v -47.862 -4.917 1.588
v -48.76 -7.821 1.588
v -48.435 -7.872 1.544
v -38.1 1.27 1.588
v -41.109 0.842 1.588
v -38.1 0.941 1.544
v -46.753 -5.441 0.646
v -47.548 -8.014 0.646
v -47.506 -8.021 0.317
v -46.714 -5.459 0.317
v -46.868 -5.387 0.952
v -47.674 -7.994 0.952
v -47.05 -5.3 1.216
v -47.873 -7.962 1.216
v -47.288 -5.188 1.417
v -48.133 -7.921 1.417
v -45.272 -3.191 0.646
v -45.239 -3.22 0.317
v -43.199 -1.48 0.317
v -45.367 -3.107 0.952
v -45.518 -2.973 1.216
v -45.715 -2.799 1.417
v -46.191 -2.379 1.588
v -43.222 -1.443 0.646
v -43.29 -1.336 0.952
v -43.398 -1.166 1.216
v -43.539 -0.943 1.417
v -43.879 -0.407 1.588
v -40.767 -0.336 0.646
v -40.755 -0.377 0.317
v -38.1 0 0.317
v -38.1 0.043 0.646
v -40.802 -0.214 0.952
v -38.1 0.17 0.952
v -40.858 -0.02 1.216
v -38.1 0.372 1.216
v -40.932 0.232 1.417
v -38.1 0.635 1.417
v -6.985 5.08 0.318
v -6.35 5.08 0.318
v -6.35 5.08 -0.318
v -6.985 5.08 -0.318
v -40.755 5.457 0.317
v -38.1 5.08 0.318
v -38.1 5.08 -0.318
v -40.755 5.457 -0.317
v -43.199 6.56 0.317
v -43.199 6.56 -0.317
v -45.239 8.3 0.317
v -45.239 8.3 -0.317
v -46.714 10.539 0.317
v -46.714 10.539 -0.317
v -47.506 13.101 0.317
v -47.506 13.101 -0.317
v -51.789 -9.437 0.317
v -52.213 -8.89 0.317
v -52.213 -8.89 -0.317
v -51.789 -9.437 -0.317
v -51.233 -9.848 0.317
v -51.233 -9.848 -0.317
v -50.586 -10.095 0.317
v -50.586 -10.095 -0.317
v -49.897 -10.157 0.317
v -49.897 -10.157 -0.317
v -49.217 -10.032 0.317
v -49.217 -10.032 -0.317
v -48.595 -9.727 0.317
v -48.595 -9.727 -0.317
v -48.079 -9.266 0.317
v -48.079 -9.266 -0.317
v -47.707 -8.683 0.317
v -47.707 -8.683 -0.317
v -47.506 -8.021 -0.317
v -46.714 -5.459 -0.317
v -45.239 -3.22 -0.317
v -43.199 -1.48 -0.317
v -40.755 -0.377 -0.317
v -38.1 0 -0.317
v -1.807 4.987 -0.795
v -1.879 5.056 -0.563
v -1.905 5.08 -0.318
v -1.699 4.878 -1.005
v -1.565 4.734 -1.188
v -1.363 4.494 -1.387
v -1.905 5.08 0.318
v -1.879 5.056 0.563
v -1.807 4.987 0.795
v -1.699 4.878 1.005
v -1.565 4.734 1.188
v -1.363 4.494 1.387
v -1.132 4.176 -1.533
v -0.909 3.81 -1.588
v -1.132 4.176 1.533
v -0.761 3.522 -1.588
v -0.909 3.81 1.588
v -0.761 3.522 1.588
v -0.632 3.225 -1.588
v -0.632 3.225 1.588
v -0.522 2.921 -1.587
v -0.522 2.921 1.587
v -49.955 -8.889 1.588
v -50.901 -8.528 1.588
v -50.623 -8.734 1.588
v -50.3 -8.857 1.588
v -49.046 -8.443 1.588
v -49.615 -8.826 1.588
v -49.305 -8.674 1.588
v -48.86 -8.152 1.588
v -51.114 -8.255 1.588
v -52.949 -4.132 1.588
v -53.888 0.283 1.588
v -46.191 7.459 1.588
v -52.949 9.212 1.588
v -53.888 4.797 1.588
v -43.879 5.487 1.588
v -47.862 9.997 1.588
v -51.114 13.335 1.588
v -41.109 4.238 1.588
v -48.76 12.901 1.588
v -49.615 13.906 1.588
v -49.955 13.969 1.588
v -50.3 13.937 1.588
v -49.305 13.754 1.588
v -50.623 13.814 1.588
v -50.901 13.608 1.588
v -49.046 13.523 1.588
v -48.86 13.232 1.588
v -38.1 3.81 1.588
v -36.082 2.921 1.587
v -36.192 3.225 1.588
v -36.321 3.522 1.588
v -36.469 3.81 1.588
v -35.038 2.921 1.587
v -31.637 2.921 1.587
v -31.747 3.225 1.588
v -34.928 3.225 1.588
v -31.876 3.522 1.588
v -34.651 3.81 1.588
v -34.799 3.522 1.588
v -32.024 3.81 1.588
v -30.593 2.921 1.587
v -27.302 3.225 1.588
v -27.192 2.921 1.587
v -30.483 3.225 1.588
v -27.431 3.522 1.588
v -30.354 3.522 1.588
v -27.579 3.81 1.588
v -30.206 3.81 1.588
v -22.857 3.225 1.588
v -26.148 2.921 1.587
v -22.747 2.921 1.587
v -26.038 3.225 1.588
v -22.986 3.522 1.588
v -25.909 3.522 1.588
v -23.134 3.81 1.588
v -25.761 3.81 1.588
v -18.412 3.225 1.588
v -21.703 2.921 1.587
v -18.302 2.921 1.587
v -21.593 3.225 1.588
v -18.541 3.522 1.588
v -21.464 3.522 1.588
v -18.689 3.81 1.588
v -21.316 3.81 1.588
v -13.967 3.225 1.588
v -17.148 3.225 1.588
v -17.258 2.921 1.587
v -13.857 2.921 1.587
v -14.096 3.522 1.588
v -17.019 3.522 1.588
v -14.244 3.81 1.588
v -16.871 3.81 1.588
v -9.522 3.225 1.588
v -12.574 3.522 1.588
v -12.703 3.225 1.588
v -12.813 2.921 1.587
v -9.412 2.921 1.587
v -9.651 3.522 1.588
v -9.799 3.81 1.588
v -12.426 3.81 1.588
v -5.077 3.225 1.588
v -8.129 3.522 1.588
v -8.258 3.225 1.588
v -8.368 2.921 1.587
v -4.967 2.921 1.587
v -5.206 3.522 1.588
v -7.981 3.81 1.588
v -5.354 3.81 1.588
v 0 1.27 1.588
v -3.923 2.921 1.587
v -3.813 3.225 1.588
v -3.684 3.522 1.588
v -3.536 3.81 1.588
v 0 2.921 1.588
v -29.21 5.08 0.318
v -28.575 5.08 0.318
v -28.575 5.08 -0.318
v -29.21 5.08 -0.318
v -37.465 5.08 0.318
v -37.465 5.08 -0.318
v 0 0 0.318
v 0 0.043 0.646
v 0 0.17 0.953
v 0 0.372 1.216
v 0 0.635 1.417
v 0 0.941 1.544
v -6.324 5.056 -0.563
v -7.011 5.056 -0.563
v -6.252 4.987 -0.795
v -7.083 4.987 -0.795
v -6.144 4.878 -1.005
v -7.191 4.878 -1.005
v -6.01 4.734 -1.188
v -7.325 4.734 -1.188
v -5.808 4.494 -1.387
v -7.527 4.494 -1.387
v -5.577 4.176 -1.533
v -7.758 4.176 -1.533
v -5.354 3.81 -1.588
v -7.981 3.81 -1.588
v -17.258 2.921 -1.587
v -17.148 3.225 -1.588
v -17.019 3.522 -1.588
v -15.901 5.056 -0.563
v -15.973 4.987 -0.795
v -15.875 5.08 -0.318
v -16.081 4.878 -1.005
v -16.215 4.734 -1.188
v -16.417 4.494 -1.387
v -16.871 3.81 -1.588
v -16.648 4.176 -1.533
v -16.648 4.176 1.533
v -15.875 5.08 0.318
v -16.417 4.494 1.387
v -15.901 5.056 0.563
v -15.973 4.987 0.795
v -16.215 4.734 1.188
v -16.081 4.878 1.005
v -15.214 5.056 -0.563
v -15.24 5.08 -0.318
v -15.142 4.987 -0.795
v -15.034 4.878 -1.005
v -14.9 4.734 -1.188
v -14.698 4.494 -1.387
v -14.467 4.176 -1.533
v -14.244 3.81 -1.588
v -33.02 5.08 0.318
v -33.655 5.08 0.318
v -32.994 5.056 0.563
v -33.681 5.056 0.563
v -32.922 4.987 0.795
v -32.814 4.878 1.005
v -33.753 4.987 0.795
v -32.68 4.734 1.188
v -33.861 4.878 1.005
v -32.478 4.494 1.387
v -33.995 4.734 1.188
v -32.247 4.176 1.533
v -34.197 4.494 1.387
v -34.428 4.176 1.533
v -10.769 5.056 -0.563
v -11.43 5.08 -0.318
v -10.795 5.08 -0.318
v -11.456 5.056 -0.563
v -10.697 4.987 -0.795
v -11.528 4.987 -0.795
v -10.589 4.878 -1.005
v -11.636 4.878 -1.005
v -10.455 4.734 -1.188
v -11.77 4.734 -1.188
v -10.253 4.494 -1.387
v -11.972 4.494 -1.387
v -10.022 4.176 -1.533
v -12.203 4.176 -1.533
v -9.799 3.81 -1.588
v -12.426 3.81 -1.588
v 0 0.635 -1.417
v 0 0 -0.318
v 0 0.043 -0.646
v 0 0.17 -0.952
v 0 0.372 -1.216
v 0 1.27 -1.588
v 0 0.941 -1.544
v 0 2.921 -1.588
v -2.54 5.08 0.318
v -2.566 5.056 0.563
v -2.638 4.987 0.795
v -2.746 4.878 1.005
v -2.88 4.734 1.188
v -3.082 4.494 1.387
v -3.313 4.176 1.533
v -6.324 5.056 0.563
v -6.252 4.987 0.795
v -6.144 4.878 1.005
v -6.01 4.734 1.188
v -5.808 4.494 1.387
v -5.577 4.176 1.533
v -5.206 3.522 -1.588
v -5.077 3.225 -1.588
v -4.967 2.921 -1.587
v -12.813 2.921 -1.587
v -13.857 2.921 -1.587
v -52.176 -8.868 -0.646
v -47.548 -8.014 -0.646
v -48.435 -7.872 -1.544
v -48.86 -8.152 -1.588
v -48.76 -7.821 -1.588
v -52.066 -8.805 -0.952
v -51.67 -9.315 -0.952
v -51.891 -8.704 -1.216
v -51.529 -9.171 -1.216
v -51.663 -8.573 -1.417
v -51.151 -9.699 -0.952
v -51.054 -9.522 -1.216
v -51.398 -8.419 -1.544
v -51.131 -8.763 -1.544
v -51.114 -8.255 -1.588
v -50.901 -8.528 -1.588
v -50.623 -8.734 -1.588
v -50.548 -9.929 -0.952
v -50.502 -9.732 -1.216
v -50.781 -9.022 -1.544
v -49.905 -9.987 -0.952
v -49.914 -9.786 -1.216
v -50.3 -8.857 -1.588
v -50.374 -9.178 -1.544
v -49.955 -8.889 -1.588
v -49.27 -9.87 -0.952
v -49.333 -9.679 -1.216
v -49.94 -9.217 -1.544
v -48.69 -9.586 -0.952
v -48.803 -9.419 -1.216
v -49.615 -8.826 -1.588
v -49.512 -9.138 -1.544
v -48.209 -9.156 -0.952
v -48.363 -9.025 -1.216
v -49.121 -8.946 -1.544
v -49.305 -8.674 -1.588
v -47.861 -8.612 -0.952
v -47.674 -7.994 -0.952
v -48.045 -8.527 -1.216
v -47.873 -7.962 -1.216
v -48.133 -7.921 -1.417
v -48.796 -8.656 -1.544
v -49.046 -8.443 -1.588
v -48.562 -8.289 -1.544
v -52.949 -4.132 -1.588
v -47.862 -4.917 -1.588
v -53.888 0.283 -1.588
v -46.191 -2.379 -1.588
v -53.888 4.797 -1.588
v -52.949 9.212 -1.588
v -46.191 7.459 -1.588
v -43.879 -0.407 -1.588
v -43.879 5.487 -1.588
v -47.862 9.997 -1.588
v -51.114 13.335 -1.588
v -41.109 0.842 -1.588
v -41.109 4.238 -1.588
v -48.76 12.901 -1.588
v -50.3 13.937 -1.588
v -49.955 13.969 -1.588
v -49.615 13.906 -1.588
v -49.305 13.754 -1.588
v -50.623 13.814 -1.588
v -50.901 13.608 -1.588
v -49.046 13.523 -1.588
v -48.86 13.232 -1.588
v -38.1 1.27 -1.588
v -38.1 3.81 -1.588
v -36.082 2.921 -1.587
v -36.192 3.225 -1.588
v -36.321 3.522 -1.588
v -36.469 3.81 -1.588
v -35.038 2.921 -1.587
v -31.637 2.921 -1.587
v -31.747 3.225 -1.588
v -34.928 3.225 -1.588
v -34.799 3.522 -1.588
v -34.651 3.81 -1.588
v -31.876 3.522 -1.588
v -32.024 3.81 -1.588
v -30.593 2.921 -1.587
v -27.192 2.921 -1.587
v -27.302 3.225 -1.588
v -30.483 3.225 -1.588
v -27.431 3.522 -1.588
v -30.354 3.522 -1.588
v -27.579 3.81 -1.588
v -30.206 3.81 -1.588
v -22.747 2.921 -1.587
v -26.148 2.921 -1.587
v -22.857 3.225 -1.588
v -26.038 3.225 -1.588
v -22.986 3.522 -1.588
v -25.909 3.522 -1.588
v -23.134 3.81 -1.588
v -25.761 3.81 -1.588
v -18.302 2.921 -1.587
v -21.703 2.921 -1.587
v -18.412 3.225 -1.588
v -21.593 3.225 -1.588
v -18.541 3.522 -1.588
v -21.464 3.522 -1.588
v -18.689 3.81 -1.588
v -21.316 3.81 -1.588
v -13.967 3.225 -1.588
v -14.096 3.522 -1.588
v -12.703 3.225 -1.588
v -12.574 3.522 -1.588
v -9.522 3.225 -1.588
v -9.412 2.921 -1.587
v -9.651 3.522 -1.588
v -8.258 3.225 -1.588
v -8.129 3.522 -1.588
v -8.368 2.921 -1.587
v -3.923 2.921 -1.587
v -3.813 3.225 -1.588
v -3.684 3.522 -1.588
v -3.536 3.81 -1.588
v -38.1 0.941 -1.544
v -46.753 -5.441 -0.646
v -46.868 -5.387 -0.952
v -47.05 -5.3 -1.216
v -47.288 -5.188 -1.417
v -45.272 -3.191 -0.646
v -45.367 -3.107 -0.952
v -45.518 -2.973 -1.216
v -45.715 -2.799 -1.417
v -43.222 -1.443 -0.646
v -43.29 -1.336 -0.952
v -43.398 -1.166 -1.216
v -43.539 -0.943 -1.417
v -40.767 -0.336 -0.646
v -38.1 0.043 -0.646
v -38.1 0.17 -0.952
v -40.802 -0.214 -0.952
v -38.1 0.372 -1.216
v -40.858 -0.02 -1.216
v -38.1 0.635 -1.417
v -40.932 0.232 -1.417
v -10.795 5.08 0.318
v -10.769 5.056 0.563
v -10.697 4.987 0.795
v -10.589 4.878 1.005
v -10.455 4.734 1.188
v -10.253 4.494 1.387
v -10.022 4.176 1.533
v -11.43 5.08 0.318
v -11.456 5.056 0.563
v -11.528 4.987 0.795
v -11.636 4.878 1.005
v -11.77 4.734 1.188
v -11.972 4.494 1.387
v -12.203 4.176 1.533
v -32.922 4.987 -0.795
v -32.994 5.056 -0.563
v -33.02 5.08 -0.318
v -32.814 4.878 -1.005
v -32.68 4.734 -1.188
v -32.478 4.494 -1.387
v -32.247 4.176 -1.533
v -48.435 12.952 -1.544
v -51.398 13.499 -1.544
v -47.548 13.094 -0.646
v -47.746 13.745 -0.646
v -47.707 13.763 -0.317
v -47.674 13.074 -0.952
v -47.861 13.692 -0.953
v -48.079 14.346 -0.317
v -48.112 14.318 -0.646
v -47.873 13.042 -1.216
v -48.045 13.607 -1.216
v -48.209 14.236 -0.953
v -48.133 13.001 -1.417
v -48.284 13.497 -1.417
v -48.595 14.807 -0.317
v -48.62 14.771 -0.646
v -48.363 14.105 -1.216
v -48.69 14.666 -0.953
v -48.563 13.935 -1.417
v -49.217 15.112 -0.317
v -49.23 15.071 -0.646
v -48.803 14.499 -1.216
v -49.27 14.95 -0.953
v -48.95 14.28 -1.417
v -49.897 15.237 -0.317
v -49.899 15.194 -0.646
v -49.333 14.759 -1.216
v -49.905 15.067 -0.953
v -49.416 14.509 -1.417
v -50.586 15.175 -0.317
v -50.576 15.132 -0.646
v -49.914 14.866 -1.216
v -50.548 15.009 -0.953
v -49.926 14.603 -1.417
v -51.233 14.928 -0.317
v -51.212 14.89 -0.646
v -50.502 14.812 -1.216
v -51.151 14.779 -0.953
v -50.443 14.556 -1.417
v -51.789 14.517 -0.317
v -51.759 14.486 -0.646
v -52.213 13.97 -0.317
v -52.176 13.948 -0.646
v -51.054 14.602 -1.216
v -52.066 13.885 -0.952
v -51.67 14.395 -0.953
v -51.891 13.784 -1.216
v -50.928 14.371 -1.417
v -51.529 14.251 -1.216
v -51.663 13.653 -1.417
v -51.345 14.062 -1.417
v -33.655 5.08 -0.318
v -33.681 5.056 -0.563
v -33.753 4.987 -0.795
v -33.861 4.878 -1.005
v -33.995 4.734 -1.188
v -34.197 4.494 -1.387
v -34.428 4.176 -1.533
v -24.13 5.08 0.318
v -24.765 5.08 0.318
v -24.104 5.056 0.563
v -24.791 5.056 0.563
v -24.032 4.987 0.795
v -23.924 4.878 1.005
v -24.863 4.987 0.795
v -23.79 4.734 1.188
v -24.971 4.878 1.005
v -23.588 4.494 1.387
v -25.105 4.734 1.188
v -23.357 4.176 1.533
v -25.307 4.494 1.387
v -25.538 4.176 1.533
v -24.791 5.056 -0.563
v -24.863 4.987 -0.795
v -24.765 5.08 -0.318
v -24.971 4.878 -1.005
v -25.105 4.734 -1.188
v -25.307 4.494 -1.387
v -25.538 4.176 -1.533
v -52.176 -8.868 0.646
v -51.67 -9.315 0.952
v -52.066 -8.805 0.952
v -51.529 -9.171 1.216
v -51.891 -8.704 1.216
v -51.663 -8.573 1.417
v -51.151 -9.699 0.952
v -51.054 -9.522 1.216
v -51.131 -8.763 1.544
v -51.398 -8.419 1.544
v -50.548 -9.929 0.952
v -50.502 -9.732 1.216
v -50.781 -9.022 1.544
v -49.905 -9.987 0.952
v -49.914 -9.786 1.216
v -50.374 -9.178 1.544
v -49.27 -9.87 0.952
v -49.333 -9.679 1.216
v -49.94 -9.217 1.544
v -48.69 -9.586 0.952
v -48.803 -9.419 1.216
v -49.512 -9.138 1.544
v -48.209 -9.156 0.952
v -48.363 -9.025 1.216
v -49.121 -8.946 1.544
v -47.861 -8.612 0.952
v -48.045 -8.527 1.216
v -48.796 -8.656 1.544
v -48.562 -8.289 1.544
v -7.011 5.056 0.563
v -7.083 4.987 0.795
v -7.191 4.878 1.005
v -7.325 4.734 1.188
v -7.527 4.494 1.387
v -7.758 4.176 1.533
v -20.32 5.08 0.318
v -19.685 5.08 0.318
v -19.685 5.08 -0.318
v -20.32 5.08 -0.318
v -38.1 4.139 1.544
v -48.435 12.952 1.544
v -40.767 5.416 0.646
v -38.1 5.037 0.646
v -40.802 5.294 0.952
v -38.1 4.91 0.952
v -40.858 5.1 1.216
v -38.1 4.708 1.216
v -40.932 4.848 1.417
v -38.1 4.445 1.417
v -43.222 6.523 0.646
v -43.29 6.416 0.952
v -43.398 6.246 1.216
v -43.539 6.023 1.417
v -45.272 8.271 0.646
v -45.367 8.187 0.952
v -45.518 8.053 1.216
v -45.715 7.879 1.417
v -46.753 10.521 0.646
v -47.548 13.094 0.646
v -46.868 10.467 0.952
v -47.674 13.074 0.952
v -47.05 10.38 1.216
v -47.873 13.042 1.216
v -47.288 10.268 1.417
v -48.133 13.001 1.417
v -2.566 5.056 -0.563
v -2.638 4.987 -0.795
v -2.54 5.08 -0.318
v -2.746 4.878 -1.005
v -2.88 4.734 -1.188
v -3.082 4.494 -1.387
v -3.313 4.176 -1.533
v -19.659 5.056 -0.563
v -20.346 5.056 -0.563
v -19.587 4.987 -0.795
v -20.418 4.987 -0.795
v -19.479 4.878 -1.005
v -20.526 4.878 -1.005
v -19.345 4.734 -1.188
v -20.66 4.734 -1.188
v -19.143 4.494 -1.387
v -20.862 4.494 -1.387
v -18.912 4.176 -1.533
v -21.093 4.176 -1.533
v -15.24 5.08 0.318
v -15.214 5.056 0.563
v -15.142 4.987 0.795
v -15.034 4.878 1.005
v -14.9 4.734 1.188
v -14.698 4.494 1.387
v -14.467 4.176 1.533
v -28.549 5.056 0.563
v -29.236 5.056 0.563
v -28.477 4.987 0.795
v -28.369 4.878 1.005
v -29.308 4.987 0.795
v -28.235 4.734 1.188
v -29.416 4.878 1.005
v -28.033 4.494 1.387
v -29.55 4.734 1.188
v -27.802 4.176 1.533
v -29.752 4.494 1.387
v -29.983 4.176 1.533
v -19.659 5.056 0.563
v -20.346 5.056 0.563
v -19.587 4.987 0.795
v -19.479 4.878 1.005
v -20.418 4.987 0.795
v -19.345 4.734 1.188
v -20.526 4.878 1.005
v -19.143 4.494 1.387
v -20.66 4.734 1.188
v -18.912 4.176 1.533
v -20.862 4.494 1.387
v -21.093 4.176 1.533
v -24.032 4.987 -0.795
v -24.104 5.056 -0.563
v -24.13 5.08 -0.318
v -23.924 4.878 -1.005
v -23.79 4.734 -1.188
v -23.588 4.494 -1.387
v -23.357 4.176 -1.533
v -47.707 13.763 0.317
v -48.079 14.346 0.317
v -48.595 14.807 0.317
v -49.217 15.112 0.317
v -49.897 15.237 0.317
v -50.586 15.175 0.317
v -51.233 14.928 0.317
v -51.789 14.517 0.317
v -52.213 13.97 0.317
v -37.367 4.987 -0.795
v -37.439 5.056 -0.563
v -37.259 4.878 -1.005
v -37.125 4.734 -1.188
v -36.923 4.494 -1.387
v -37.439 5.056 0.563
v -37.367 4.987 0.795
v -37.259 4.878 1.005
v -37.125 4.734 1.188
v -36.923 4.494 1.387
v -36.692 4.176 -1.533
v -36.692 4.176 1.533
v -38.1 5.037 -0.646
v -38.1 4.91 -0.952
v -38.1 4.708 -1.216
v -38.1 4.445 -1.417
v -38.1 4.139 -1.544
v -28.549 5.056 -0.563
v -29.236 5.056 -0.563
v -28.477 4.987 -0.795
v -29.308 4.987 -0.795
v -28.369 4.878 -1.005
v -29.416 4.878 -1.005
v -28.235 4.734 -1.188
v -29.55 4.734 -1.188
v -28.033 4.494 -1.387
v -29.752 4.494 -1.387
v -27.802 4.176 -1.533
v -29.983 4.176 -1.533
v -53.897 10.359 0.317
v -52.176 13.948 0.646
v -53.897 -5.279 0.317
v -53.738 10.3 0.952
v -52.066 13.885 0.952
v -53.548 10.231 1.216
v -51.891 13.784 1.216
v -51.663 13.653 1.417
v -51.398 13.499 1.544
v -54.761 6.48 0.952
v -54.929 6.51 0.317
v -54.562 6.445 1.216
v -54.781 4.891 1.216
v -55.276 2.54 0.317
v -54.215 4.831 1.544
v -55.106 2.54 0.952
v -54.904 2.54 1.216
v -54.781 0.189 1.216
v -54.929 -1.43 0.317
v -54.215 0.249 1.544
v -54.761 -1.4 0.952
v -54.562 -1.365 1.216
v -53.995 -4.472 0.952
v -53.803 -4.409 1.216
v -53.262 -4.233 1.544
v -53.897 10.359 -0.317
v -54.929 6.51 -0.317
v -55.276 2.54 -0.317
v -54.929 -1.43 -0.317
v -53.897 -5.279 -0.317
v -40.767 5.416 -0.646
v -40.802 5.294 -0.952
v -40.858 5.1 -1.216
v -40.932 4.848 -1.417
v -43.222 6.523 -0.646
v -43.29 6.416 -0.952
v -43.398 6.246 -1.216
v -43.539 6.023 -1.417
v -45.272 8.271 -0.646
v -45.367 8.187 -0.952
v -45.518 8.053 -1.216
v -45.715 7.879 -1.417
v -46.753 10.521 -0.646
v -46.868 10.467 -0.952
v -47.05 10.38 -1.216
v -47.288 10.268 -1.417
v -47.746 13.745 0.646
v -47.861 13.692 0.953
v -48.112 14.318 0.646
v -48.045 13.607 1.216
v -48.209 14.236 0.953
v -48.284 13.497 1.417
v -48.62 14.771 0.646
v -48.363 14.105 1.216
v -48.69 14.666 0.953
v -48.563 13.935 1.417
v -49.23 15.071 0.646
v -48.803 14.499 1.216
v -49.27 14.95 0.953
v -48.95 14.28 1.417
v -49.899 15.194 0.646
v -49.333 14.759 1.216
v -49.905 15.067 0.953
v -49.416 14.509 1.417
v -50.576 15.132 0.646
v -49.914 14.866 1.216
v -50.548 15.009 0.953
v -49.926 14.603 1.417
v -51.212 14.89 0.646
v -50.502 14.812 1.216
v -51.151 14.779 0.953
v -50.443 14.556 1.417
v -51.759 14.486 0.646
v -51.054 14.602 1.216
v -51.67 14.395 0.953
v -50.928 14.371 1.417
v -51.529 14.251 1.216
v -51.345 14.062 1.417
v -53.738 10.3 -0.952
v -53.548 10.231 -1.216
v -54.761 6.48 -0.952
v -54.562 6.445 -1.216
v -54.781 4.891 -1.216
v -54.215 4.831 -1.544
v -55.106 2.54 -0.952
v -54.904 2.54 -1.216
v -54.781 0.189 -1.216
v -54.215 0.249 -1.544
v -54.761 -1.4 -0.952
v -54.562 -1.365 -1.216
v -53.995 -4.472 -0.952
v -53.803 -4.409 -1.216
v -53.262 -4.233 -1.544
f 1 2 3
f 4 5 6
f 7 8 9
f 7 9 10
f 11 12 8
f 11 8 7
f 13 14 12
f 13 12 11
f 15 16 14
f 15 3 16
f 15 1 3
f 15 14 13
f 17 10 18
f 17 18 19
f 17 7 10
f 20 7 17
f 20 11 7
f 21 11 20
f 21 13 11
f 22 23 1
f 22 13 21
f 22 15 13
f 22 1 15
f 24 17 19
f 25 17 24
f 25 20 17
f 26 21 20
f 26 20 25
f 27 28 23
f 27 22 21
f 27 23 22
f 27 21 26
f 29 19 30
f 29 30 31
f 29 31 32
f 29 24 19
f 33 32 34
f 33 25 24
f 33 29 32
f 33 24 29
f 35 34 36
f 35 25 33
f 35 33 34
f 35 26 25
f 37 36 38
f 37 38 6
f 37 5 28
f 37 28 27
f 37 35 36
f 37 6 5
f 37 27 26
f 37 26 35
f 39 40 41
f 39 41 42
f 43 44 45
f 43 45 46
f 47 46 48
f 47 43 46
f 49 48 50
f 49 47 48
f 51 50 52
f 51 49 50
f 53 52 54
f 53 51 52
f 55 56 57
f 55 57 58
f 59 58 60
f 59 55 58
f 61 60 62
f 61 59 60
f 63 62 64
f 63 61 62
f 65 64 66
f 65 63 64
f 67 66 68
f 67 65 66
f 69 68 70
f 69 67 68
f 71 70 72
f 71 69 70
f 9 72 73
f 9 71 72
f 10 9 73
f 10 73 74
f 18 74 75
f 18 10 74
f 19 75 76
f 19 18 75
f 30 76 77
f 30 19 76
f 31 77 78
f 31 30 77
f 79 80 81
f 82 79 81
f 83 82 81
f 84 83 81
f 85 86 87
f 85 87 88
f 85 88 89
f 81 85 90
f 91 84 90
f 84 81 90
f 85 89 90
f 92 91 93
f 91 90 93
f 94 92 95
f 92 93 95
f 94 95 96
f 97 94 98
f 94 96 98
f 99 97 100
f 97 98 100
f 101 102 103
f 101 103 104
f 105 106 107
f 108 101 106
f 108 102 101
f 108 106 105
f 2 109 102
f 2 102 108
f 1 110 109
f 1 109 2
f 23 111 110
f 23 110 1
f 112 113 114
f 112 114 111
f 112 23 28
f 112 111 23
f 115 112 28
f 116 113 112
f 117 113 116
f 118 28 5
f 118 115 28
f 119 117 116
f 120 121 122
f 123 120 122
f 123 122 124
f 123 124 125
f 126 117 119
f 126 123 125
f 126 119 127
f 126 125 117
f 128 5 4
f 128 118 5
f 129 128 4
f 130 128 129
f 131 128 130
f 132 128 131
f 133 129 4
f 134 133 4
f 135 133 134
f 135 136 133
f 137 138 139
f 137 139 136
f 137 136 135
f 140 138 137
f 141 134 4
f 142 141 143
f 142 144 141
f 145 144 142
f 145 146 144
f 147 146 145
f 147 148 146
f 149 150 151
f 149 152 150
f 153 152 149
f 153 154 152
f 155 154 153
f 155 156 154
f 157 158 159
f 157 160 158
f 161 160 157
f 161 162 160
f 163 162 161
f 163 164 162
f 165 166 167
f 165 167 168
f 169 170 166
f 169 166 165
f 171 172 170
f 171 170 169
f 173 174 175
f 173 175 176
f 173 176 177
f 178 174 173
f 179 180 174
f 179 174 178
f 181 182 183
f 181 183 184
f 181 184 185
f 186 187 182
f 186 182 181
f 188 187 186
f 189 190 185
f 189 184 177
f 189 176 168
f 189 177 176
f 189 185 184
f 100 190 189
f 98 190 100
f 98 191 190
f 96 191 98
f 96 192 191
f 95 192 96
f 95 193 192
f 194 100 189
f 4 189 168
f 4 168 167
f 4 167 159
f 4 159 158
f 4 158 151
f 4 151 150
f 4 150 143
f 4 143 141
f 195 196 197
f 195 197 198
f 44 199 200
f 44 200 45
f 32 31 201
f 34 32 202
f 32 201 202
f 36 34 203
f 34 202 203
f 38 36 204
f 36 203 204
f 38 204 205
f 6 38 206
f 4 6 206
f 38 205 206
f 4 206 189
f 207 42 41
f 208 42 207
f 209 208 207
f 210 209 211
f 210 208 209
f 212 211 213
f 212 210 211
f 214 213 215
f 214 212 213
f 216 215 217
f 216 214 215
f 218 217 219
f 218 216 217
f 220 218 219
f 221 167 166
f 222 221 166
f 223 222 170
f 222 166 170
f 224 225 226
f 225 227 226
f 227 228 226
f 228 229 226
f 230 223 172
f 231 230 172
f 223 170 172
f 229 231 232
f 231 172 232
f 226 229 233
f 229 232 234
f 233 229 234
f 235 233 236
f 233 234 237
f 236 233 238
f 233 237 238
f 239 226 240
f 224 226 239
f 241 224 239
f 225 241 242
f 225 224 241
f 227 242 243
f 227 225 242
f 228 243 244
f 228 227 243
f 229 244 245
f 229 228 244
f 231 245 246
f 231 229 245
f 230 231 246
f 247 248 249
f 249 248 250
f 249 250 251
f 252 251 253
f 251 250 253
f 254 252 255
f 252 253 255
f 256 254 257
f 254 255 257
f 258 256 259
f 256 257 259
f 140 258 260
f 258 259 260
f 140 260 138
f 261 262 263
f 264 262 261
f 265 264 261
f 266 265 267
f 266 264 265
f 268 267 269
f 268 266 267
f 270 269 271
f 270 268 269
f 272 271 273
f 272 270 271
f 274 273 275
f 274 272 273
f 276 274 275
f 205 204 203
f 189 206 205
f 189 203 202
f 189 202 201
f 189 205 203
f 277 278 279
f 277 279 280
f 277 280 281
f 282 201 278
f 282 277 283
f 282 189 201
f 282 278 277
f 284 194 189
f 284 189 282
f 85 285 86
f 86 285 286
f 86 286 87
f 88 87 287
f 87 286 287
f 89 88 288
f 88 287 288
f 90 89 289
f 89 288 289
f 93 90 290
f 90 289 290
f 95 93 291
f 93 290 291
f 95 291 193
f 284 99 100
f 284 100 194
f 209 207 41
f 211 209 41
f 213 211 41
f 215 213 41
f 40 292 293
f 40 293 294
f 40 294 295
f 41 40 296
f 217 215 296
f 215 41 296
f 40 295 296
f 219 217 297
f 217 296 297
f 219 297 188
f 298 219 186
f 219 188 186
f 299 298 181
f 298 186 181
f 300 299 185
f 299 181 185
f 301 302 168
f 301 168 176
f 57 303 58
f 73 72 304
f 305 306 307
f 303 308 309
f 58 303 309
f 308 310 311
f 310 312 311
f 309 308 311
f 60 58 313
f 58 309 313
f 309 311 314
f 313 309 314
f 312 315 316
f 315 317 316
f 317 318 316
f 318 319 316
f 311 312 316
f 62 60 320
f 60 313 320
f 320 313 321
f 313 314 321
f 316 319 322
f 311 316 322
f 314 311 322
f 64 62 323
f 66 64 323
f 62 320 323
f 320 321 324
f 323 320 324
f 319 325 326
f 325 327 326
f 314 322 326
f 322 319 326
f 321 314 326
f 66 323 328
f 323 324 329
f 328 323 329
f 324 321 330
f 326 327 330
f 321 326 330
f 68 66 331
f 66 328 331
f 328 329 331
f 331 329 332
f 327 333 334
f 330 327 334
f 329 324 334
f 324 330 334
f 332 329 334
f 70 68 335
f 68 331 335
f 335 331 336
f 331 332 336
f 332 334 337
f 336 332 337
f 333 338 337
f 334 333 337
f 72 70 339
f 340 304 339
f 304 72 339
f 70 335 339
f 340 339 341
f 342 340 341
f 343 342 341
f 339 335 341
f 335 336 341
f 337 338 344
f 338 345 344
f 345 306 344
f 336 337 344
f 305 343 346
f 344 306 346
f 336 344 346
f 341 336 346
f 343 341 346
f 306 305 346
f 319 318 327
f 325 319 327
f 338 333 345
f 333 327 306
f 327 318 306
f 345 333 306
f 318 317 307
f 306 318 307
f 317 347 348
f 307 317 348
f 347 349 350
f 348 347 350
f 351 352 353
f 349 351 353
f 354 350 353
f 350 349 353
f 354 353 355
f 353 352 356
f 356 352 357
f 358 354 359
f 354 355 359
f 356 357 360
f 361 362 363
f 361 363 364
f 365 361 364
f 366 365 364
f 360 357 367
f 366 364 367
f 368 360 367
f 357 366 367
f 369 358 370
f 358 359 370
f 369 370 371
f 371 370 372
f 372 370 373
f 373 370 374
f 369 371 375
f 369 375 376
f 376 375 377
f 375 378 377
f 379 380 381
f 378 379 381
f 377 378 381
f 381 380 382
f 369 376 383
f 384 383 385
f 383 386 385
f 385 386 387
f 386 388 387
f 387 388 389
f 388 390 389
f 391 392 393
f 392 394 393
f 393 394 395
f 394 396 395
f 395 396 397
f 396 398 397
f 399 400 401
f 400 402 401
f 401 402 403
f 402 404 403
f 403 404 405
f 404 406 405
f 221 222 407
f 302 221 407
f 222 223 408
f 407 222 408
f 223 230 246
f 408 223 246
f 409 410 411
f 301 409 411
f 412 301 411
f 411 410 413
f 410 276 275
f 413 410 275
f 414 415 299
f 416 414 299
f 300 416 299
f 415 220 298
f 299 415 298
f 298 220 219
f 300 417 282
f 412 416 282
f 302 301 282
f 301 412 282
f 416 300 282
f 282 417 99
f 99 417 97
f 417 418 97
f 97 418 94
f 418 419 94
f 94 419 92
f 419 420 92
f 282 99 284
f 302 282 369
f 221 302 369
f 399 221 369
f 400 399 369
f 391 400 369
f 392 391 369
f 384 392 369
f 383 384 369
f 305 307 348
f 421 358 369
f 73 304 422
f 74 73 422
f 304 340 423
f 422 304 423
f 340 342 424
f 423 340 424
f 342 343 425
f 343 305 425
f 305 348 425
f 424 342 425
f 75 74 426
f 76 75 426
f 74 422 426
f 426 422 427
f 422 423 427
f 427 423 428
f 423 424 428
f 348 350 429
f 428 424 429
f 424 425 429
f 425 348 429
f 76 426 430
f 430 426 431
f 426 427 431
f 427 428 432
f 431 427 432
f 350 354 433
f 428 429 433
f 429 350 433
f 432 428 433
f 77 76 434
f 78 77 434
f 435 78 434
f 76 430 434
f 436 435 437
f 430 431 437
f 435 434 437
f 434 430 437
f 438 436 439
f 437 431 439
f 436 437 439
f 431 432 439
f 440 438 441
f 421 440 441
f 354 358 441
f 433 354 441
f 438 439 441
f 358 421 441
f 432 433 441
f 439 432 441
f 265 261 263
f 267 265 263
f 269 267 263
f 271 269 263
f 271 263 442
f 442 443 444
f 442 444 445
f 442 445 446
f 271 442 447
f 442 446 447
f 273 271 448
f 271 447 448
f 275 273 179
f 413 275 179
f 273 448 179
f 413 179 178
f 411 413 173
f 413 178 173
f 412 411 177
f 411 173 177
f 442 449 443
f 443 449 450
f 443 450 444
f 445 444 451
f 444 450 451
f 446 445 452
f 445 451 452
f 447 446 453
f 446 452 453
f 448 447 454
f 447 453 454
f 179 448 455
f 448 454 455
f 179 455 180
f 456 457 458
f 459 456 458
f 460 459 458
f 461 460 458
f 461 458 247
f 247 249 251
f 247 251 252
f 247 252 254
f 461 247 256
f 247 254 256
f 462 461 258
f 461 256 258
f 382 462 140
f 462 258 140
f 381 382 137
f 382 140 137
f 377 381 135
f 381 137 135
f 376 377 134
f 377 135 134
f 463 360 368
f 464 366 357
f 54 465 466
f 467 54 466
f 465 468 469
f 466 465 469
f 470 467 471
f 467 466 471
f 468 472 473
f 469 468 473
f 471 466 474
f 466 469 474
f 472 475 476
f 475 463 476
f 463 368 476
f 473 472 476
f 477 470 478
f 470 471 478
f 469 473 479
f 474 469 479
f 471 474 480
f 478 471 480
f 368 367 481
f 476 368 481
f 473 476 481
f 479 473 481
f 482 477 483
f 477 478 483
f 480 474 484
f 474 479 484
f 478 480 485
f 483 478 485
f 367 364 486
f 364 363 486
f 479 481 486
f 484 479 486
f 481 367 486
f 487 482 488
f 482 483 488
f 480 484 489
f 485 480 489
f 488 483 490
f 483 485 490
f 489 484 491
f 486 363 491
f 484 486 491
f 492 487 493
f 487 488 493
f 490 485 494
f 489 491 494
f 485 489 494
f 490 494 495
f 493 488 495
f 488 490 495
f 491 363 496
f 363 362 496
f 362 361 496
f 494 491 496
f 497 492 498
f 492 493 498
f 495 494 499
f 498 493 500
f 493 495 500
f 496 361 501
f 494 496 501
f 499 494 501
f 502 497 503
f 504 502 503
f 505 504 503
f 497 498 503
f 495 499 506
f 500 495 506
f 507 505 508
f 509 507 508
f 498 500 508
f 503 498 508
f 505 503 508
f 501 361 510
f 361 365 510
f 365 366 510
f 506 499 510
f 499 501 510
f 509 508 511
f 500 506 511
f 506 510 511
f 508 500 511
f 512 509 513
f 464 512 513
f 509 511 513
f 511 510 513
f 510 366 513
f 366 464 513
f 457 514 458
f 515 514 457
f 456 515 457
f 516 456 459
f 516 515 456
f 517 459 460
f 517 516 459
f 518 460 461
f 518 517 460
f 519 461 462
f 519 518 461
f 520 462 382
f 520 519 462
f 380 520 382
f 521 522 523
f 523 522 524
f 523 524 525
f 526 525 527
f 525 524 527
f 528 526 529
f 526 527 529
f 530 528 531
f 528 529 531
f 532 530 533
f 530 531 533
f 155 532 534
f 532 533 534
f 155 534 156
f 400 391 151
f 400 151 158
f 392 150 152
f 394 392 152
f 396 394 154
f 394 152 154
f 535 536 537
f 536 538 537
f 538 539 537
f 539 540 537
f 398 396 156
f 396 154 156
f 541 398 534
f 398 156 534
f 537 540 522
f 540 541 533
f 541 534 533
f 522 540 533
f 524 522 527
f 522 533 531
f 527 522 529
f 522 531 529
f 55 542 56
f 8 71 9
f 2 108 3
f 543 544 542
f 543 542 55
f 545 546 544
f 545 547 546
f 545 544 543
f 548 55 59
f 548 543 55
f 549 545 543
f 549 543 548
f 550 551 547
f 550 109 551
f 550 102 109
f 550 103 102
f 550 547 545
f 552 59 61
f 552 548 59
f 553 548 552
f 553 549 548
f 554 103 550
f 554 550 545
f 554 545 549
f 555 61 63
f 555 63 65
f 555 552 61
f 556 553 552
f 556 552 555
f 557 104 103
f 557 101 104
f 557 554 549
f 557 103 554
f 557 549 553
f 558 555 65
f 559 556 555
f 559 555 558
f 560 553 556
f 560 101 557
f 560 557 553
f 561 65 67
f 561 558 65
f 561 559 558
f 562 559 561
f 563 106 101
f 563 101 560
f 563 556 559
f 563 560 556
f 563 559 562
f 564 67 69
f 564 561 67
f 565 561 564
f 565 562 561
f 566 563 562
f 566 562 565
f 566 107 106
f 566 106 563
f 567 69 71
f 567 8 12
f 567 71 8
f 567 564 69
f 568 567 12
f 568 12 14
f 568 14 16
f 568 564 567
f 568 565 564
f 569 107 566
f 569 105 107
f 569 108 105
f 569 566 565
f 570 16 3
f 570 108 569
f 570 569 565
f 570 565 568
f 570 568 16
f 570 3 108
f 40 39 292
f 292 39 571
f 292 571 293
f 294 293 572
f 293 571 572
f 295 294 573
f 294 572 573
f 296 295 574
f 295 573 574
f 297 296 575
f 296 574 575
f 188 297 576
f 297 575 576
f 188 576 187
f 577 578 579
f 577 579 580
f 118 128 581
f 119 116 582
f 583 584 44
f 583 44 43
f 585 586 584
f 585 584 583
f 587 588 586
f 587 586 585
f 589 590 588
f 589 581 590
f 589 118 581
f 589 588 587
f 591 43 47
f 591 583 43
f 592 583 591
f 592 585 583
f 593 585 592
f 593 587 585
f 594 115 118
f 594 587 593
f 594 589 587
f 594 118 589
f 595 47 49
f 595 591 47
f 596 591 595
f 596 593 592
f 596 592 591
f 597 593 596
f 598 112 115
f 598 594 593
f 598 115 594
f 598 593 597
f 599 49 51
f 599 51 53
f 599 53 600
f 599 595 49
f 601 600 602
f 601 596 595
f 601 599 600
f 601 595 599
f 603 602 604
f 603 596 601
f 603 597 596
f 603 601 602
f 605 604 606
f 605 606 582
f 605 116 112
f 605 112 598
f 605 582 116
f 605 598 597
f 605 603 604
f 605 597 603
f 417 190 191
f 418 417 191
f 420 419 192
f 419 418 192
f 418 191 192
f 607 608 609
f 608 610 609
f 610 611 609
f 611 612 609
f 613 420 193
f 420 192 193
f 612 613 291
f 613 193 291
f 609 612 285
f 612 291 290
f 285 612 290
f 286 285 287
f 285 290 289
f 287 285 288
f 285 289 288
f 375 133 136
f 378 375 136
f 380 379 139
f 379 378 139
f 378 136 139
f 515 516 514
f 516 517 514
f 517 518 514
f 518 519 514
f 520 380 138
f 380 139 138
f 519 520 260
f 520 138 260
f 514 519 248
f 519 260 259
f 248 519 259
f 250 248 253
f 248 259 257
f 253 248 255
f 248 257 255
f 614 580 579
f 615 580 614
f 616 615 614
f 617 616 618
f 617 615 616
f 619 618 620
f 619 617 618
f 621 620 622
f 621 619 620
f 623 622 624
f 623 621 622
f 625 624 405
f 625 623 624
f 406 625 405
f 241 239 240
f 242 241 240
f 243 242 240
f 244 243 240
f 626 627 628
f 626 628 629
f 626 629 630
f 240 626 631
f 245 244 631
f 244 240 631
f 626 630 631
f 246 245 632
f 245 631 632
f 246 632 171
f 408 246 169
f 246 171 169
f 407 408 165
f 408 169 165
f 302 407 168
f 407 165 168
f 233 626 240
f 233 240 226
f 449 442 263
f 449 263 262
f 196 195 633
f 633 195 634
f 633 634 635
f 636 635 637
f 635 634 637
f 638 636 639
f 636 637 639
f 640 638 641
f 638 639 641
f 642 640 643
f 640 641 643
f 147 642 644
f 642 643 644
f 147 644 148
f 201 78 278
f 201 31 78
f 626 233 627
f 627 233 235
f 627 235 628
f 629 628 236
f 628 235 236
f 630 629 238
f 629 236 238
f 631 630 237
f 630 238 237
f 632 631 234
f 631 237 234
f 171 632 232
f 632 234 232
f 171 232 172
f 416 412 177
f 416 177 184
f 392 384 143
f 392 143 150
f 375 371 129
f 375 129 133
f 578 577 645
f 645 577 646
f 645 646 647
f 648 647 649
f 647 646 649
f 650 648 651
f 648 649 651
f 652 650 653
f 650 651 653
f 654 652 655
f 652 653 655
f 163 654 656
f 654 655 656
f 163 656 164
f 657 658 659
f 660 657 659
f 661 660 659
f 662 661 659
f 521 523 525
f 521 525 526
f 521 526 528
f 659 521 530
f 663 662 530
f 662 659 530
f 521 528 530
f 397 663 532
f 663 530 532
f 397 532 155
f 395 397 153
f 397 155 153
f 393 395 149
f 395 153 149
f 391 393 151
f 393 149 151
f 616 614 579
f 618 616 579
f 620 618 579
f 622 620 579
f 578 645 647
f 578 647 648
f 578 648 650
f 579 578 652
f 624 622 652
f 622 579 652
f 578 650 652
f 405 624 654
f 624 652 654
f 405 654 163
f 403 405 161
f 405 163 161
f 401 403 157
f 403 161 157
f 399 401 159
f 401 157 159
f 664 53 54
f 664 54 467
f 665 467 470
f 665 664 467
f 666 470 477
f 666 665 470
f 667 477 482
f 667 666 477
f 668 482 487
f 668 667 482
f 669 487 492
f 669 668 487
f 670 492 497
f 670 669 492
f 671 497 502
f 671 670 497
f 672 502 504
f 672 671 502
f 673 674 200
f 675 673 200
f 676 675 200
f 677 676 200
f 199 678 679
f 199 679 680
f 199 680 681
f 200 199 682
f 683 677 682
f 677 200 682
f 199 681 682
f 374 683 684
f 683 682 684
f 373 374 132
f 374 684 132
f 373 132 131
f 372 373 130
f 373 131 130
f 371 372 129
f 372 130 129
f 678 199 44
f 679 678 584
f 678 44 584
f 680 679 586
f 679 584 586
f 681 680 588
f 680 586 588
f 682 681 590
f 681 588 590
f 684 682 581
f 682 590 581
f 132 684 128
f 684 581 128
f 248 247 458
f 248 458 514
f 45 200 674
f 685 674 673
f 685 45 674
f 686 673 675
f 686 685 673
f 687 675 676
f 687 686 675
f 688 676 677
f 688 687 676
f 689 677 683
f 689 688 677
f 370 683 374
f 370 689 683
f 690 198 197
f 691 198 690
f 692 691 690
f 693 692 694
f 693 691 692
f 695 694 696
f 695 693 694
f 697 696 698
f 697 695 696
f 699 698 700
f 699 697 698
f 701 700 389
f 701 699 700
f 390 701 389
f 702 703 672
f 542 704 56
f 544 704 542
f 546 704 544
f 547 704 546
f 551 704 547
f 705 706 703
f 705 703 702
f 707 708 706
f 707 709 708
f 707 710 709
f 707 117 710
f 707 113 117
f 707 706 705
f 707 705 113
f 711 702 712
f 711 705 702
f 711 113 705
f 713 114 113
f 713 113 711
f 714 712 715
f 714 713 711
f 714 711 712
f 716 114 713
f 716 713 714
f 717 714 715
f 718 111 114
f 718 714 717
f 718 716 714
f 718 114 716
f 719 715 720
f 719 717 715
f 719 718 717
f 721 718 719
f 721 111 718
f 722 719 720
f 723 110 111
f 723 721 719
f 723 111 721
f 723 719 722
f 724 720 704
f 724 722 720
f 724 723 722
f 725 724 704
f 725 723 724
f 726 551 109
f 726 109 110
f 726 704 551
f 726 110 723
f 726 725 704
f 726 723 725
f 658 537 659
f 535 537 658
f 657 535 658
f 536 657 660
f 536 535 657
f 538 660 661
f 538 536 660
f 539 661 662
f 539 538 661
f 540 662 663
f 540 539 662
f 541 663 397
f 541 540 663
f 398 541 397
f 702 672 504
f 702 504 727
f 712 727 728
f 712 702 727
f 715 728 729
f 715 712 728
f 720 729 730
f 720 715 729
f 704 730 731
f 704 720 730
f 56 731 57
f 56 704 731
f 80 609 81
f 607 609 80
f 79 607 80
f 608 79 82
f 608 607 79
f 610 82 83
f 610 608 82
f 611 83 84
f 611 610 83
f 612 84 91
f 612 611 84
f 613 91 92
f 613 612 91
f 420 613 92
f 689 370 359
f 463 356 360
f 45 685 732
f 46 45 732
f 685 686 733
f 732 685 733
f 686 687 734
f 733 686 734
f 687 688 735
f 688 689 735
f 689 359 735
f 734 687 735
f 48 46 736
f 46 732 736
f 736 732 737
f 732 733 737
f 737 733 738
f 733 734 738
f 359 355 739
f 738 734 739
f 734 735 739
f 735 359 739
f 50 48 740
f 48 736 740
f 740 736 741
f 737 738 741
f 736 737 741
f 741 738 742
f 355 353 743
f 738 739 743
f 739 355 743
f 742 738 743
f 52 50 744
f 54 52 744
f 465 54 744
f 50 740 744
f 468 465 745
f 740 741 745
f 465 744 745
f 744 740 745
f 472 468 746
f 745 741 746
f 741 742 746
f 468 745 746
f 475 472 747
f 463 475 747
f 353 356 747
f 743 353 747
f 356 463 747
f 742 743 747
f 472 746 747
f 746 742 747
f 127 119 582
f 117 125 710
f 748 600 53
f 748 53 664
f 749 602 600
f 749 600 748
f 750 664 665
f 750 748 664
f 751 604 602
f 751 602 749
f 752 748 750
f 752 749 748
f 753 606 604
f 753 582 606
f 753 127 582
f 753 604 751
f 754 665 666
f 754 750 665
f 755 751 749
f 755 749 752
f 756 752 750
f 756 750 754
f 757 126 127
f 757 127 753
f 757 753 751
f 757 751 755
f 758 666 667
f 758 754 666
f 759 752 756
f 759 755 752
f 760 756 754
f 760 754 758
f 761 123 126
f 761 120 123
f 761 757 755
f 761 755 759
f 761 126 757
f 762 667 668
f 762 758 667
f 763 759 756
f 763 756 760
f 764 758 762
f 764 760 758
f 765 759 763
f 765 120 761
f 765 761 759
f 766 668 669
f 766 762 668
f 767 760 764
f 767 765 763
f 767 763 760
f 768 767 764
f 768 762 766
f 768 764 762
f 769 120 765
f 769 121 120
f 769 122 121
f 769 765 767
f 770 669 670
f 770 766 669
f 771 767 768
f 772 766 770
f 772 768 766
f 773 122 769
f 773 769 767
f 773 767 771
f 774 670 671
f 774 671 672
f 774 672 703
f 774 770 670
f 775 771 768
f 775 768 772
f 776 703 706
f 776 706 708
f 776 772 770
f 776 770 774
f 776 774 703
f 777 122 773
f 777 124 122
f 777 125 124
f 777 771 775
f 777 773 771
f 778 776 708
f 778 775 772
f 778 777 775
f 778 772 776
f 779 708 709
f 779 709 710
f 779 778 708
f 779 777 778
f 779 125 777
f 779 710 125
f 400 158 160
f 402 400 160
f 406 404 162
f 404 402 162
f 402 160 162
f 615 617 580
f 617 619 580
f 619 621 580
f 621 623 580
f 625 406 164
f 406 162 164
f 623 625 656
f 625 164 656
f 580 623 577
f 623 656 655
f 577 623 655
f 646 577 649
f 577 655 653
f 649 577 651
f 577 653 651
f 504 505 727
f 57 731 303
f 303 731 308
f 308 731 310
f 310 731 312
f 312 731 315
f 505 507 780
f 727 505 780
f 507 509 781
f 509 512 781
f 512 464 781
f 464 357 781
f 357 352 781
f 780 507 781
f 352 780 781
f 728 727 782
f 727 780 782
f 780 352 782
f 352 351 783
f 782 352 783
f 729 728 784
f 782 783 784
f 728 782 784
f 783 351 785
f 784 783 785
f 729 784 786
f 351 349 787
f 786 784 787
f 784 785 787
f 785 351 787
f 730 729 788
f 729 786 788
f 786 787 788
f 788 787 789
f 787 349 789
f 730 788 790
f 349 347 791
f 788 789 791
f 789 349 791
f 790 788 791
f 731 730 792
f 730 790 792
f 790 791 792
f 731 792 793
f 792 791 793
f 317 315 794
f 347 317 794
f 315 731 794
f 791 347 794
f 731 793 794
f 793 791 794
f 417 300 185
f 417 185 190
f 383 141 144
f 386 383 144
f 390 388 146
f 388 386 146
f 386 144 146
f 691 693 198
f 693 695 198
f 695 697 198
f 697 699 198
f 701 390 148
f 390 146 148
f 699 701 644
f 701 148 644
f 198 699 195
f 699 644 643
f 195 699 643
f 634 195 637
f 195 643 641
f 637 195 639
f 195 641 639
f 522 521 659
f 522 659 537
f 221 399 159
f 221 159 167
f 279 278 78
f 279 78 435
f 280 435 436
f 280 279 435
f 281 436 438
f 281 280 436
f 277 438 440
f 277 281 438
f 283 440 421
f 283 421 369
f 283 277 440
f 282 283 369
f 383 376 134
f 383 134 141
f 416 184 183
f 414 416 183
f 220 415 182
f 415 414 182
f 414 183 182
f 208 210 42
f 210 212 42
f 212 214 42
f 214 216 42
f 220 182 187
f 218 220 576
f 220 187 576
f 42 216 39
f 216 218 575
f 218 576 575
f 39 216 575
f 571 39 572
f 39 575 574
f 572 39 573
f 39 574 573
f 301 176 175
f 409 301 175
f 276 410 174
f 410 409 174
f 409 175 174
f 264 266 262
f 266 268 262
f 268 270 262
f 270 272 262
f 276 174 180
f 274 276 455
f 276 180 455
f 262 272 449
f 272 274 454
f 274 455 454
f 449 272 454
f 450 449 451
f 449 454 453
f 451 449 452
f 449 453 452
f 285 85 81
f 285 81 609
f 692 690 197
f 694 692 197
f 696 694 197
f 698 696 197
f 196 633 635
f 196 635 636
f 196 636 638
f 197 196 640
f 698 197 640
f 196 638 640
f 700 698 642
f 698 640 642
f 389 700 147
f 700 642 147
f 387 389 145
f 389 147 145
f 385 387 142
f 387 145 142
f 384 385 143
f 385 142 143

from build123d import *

# Parameters (mm, degrees)
BOSS_EXTRUDE1_DEPTH = 1.5875
FILLET1_R           = 1.27
CUT_EXTRUDE1_DEPTH  = 58.360405638
LPATTERN1_COUNT     = 16
LPATTERN1_PITCH     = 4.445
SKETCH4_R           = 7.686089714
CUT_EXTRUDE2_DEPTH  = 58.360405641


with BuildPart() as part:
    # Sketch1 → Boss-Extrude1 (new, symmetric)
    with BuildSketch(Plane.XY):
        with BuildLine():
            Line((-38.1, 0), (38.1, 0))
            Line((38.1, 0), (33.02, 5.08))
            Line((33.02, 5.08), (-38.1, 5.08))
            ThreePointArc((-38.1, 5.08), (-44.280636145, 7.357561705), (-47.505517918, 13.101052632))
            ThreePointArc((-47.505517918, 13.101052632), (-49.552624359, 15.197809), (-52.213360556, 13.97))
            ThreePointArc((-52.213360556, 13.97), (-55.276019825, 2.54), (-52.213360556, -8.89))
            ThreePointArc((-52.213360556, -8.89), (-49.552624359, -10.117809), (-47.505517918, -8.021052632))
            ThreePointArc((-47.505517918, -8.021052632), (-44.280636145, -2.277561705), (-38.1, 0))
        make_face()
    extrude(amount=BOSS_EXTRUDE1_DEPTH, both=True)

    # Fillet1
    fillet1_edges = [part.edges().sort_by_distance(p)[0] for p in [
        (-2.54, 5.08, -1.5875),
        (0, 0, -1.5875),
        (-44.280636145, -2.277561705, -1.5875),
        (-2.54, 5.08, 1.5875),
        (-44.280636145, 7.357561705, 1.5875),
        (-49.552624359, 15.197809, 1.5875),
        (-55.276019825, 2.54, 1.5875),
        (-49.552624359, -10.117809, 1.5875),
        (-44.280636145, -2.277561705, 1.5875),
        (-49.552624359, -10.117809, -1.5875),
        (0, 0, 1.5875),
        (-55.276019825, 2.54, -1.5875),
        (-49.552624359, 15.197809, -1.5875),
        (-44.280636145, 7.357561705, -1.5875),
    ]]
    fillet(fillet1_edges, radius=FILLET1_R)

    # Sketch3 → Cut-Extrude1 (cut, symmetric)
    with BuildSketch(Plane.XY):
        with BuildLine():
            Line((30.592919151, 2.921), (31.637080849, 2.921))
            ThreePointArc((31.637080849, 2.921), (32.190091062, 4.089181925), (33.02, 5.08))
            Line((33.02, 5.08), (29.21, 5.08))
            ThreePointArc((29.21, 5.08), (30.039908938, 4.089181925), (30.592919151, 2.921))
        make_face()
    cut_extrude1 = extrude(amount=CUT_EXTRUDE1_DEPTH, both=True, mode=Mode.SUBTRACT)

    # LPattern1: Cut-Extrude1 ×16
    with Locations(*[(-i * LPATTERN1_PITCH, 0, 0) for i in range(1, LPATTERN1_COUNT)]):
        add(cut_extrude1, mode=Mode.SUBTRACT)

    # Sketch4 → Cut-Extrude2 (cut, through all)
    with BuildSketch(Plane(origin=(0, 0, 0), x_dir=(0, 0, -1), z_dir=(1, 0, 0))):
        Circle(SKETCH4_R)
    extrude(amount=CUT_EXTRUDE2_DEPTH, mode=Mode.SUBTRACT)


solid = part.part
